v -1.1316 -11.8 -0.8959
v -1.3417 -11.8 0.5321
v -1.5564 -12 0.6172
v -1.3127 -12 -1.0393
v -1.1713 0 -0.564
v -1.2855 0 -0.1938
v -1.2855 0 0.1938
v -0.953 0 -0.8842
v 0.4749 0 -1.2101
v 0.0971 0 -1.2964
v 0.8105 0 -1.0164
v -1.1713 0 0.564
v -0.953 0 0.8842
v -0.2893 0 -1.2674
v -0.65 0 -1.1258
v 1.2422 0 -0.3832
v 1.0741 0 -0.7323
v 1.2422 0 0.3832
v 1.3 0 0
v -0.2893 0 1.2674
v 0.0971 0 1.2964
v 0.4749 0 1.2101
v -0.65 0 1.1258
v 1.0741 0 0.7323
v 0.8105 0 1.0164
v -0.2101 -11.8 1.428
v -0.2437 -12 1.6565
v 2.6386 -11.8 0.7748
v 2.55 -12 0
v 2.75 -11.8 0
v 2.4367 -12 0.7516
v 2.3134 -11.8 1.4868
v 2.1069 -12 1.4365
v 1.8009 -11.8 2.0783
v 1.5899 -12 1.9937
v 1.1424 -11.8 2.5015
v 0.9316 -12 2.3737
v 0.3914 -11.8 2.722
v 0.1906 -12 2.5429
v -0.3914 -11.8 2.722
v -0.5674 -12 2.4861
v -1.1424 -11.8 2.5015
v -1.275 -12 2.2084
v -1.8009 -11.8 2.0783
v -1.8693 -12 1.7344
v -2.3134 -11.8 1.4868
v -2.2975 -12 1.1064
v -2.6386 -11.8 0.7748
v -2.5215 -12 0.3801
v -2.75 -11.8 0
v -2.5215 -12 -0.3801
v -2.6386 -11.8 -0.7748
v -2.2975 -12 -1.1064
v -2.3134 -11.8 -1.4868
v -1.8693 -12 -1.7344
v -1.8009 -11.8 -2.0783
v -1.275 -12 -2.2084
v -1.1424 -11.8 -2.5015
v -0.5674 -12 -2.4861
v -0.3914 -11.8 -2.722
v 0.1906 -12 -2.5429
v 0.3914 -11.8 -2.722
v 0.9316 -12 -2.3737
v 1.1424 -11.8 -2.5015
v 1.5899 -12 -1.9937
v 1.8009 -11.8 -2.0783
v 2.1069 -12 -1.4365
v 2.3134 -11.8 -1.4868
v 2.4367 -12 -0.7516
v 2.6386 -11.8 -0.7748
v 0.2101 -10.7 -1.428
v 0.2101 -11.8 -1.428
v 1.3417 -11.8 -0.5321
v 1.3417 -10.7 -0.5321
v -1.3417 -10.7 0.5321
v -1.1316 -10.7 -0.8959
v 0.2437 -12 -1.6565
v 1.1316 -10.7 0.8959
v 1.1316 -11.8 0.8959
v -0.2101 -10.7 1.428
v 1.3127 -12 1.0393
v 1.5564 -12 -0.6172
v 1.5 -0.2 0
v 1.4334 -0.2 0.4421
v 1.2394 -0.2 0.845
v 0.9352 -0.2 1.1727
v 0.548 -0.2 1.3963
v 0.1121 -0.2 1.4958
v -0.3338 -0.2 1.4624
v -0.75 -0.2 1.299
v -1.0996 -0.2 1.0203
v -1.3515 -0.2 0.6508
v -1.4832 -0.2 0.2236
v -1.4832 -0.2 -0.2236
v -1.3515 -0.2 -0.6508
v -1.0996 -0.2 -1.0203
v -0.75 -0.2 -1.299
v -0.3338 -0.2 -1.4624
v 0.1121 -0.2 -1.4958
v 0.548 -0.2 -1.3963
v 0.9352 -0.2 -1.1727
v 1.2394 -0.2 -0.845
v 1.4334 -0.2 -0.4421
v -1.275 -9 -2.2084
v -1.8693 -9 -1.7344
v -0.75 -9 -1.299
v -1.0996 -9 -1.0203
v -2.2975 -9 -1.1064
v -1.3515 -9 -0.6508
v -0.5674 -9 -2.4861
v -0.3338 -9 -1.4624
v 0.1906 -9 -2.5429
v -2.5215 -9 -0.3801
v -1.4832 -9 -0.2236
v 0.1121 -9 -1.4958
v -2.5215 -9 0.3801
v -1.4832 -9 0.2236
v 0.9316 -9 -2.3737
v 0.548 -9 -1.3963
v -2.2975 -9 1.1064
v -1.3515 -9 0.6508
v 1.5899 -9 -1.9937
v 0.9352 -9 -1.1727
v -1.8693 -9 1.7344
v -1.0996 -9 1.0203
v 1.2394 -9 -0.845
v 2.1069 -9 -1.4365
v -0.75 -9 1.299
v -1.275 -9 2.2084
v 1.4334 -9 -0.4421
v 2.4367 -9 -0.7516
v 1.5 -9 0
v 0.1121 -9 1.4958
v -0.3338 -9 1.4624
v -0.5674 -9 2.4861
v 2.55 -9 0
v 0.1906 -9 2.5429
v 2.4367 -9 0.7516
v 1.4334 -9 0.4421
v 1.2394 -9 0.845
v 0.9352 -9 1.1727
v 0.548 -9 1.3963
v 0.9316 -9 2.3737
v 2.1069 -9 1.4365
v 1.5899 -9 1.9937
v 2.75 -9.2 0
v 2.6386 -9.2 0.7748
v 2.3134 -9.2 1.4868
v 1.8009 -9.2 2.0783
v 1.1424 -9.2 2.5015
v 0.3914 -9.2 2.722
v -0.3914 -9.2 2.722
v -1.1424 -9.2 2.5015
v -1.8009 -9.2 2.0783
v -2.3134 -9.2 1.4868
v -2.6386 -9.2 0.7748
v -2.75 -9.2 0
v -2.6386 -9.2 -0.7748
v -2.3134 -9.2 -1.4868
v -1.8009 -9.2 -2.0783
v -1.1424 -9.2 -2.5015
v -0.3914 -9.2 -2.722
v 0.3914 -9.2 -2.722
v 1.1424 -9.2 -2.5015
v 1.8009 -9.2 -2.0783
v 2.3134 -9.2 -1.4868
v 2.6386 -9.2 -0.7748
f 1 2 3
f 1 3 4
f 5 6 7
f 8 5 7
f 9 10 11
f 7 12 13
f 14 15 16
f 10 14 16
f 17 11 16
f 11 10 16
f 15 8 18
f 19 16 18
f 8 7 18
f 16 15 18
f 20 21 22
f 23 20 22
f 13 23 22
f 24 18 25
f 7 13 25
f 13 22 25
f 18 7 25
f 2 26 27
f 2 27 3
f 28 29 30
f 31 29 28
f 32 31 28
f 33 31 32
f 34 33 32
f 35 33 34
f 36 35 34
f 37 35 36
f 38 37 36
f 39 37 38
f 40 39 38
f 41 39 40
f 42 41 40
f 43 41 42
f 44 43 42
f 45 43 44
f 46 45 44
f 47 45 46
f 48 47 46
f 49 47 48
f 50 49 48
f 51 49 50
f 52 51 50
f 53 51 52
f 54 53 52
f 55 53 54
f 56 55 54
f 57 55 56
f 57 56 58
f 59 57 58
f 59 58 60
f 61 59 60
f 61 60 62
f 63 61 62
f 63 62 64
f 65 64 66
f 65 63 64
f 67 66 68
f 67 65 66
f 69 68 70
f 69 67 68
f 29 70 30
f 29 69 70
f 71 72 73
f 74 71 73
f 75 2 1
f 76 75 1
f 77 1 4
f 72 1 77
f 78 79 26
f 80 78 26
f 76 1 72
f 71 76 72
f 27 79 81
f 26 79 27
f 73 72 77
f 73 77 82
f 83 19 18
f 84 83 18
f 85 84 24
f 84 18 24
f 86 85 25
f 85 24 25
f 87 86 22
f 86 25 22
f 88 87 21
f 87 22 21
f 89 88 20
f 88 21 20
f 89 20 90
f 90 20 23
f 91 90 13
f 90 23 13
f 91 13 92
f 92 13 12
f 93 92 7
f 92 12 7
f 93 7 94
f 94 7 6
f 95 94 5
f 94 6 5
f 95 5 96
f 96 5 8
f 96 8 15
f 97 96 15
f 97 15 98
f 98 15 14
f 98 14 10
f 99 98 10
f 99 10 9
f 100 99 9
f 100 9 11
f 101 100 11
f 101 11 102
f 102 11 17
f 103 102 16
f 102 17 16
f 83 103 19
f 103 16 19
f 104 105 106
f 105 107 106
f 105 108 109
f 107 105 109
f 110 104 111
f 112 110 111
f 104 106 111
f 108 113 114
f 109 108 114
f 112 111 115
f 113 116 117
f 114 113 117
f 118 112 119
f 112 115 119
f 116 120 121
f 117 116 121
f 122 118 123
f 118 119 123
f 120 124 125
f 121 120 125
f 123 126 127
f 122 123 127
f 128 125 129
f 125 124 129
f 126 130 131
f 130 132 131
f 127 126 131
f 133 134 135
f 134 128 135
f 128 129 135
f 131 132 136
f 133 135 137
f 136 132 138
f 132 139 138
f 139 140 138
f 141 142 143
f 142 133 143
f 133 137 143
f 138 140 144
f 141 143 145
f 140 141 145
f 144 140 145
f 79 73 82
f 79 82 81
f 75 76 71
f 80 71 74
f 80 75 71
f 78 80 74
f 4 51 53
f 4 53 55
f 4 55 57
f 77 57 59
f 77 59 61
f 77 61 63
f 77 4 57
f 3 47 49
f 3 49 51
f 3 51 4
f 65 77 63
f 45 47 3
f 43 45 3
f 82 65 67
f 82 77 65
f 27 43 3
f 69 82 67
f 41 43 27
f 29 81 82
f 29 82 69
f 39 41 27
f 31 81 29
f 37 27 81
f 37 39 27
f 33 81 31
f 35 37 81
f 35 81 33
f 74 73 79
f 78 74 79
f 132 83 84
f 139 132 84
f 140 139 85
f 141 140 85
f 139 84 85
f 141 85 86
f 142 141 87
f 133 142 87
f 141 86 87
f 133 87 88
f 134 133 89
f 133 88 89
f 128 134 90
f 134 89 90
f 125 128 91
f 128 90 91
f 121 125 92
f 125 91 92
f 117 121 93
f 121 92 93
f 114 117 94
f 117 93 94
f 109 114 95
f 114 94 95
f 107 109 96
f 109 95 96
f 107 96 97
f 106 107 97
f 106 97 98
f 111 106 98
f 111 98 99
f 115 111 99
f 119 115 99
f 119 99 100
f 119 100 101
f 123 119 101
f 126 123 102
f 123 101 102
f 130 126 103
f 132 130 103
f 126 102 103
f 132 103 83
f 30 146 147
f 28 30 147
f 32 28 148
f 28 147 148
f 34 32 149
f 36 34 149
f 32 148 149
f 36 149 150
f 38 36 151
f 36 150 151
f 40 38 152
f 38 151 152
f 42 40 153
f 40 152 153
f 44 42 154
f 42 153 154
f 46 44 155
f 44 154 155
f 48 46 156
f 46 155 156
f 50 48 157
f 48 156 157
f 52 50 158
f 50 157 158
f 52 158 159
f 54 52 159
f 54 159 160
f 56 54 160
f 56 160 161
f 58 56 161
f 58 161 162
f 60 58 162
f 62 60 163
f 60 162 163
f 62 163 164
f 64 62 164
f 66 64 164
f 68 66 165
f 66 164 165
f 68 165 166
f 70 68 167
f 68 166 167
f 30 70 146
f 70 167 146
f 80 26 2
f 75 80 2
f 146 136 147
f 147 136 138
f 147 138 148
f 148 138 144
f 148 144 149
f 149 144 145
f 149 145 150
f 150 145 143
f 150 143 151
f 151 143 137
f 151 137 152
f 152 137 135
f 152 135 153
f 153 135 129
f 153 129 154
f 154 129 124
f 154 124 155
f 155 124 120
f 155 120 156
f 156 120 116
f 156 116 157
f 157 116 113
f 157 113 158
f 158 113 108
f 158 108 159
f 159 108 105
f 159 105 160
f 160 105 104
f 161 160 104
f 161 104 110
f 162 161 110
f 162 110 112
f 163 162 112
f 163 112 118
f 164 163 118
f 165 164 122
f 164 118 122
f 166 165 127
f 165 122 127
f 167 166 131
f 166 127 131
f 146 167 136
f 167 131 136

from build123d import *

# Parameters (mm, degrees)
F0_R     = 1.5
F1_DEPTH = 9
F2_R     = 2.75
F3_DEPTH = 3
F5_DEPTH = 1.3
F6_SIZE  = 0.2


with BuildPart() as f1:
    # F0 (on Front) → F1 (new body)
    with BuildSketch(Plane.XZ):
        Circle(F0_R)
    extrude(amount=F1_DEPTH)

    # F2 (on face) → F3 (join)
    with BuildSketch(Plane.XZ.offset(9)):
        Circle(F2_R)
    extrude(amount=F3_DEPTH)

    # F4 (on face) → F5 (cut)
    with BuildSketch(Plane.XZ.offset(12)):
        Polygon((0.2100819211, -1.428005224), (1.3417297613, -0.5320663314), (1.1316478402, 0.8959388926), (-0.2100819211, 1.428005224), (-1.3417297613, 0.5320663314), (-1.1316478402, -0.8959388926), align=None)
    extrude(amount=-F5_DEPTH, mode=Mode.SUBTRACT)

    # F6
    f6_edges = [f1.edges().sort_by_distance(p)[0] for p in [
        (-2.75, -12, 0),
        (-2.75, -9, 0),
        (-1.5, 0, 0),
        (-1.236689, -12, -0.181936),
        (-0.460783, -12, -1.161972),
        (0.775906, -12, -0.980036),
        (1.236689, -12, 0.181936),
        (0.460783, -12, 1.161972),
        (-0.775906, -12, 0.980036),
    ]]
    chamfer(f6_edges, length=F6_SIZE)


solid = f1.part
